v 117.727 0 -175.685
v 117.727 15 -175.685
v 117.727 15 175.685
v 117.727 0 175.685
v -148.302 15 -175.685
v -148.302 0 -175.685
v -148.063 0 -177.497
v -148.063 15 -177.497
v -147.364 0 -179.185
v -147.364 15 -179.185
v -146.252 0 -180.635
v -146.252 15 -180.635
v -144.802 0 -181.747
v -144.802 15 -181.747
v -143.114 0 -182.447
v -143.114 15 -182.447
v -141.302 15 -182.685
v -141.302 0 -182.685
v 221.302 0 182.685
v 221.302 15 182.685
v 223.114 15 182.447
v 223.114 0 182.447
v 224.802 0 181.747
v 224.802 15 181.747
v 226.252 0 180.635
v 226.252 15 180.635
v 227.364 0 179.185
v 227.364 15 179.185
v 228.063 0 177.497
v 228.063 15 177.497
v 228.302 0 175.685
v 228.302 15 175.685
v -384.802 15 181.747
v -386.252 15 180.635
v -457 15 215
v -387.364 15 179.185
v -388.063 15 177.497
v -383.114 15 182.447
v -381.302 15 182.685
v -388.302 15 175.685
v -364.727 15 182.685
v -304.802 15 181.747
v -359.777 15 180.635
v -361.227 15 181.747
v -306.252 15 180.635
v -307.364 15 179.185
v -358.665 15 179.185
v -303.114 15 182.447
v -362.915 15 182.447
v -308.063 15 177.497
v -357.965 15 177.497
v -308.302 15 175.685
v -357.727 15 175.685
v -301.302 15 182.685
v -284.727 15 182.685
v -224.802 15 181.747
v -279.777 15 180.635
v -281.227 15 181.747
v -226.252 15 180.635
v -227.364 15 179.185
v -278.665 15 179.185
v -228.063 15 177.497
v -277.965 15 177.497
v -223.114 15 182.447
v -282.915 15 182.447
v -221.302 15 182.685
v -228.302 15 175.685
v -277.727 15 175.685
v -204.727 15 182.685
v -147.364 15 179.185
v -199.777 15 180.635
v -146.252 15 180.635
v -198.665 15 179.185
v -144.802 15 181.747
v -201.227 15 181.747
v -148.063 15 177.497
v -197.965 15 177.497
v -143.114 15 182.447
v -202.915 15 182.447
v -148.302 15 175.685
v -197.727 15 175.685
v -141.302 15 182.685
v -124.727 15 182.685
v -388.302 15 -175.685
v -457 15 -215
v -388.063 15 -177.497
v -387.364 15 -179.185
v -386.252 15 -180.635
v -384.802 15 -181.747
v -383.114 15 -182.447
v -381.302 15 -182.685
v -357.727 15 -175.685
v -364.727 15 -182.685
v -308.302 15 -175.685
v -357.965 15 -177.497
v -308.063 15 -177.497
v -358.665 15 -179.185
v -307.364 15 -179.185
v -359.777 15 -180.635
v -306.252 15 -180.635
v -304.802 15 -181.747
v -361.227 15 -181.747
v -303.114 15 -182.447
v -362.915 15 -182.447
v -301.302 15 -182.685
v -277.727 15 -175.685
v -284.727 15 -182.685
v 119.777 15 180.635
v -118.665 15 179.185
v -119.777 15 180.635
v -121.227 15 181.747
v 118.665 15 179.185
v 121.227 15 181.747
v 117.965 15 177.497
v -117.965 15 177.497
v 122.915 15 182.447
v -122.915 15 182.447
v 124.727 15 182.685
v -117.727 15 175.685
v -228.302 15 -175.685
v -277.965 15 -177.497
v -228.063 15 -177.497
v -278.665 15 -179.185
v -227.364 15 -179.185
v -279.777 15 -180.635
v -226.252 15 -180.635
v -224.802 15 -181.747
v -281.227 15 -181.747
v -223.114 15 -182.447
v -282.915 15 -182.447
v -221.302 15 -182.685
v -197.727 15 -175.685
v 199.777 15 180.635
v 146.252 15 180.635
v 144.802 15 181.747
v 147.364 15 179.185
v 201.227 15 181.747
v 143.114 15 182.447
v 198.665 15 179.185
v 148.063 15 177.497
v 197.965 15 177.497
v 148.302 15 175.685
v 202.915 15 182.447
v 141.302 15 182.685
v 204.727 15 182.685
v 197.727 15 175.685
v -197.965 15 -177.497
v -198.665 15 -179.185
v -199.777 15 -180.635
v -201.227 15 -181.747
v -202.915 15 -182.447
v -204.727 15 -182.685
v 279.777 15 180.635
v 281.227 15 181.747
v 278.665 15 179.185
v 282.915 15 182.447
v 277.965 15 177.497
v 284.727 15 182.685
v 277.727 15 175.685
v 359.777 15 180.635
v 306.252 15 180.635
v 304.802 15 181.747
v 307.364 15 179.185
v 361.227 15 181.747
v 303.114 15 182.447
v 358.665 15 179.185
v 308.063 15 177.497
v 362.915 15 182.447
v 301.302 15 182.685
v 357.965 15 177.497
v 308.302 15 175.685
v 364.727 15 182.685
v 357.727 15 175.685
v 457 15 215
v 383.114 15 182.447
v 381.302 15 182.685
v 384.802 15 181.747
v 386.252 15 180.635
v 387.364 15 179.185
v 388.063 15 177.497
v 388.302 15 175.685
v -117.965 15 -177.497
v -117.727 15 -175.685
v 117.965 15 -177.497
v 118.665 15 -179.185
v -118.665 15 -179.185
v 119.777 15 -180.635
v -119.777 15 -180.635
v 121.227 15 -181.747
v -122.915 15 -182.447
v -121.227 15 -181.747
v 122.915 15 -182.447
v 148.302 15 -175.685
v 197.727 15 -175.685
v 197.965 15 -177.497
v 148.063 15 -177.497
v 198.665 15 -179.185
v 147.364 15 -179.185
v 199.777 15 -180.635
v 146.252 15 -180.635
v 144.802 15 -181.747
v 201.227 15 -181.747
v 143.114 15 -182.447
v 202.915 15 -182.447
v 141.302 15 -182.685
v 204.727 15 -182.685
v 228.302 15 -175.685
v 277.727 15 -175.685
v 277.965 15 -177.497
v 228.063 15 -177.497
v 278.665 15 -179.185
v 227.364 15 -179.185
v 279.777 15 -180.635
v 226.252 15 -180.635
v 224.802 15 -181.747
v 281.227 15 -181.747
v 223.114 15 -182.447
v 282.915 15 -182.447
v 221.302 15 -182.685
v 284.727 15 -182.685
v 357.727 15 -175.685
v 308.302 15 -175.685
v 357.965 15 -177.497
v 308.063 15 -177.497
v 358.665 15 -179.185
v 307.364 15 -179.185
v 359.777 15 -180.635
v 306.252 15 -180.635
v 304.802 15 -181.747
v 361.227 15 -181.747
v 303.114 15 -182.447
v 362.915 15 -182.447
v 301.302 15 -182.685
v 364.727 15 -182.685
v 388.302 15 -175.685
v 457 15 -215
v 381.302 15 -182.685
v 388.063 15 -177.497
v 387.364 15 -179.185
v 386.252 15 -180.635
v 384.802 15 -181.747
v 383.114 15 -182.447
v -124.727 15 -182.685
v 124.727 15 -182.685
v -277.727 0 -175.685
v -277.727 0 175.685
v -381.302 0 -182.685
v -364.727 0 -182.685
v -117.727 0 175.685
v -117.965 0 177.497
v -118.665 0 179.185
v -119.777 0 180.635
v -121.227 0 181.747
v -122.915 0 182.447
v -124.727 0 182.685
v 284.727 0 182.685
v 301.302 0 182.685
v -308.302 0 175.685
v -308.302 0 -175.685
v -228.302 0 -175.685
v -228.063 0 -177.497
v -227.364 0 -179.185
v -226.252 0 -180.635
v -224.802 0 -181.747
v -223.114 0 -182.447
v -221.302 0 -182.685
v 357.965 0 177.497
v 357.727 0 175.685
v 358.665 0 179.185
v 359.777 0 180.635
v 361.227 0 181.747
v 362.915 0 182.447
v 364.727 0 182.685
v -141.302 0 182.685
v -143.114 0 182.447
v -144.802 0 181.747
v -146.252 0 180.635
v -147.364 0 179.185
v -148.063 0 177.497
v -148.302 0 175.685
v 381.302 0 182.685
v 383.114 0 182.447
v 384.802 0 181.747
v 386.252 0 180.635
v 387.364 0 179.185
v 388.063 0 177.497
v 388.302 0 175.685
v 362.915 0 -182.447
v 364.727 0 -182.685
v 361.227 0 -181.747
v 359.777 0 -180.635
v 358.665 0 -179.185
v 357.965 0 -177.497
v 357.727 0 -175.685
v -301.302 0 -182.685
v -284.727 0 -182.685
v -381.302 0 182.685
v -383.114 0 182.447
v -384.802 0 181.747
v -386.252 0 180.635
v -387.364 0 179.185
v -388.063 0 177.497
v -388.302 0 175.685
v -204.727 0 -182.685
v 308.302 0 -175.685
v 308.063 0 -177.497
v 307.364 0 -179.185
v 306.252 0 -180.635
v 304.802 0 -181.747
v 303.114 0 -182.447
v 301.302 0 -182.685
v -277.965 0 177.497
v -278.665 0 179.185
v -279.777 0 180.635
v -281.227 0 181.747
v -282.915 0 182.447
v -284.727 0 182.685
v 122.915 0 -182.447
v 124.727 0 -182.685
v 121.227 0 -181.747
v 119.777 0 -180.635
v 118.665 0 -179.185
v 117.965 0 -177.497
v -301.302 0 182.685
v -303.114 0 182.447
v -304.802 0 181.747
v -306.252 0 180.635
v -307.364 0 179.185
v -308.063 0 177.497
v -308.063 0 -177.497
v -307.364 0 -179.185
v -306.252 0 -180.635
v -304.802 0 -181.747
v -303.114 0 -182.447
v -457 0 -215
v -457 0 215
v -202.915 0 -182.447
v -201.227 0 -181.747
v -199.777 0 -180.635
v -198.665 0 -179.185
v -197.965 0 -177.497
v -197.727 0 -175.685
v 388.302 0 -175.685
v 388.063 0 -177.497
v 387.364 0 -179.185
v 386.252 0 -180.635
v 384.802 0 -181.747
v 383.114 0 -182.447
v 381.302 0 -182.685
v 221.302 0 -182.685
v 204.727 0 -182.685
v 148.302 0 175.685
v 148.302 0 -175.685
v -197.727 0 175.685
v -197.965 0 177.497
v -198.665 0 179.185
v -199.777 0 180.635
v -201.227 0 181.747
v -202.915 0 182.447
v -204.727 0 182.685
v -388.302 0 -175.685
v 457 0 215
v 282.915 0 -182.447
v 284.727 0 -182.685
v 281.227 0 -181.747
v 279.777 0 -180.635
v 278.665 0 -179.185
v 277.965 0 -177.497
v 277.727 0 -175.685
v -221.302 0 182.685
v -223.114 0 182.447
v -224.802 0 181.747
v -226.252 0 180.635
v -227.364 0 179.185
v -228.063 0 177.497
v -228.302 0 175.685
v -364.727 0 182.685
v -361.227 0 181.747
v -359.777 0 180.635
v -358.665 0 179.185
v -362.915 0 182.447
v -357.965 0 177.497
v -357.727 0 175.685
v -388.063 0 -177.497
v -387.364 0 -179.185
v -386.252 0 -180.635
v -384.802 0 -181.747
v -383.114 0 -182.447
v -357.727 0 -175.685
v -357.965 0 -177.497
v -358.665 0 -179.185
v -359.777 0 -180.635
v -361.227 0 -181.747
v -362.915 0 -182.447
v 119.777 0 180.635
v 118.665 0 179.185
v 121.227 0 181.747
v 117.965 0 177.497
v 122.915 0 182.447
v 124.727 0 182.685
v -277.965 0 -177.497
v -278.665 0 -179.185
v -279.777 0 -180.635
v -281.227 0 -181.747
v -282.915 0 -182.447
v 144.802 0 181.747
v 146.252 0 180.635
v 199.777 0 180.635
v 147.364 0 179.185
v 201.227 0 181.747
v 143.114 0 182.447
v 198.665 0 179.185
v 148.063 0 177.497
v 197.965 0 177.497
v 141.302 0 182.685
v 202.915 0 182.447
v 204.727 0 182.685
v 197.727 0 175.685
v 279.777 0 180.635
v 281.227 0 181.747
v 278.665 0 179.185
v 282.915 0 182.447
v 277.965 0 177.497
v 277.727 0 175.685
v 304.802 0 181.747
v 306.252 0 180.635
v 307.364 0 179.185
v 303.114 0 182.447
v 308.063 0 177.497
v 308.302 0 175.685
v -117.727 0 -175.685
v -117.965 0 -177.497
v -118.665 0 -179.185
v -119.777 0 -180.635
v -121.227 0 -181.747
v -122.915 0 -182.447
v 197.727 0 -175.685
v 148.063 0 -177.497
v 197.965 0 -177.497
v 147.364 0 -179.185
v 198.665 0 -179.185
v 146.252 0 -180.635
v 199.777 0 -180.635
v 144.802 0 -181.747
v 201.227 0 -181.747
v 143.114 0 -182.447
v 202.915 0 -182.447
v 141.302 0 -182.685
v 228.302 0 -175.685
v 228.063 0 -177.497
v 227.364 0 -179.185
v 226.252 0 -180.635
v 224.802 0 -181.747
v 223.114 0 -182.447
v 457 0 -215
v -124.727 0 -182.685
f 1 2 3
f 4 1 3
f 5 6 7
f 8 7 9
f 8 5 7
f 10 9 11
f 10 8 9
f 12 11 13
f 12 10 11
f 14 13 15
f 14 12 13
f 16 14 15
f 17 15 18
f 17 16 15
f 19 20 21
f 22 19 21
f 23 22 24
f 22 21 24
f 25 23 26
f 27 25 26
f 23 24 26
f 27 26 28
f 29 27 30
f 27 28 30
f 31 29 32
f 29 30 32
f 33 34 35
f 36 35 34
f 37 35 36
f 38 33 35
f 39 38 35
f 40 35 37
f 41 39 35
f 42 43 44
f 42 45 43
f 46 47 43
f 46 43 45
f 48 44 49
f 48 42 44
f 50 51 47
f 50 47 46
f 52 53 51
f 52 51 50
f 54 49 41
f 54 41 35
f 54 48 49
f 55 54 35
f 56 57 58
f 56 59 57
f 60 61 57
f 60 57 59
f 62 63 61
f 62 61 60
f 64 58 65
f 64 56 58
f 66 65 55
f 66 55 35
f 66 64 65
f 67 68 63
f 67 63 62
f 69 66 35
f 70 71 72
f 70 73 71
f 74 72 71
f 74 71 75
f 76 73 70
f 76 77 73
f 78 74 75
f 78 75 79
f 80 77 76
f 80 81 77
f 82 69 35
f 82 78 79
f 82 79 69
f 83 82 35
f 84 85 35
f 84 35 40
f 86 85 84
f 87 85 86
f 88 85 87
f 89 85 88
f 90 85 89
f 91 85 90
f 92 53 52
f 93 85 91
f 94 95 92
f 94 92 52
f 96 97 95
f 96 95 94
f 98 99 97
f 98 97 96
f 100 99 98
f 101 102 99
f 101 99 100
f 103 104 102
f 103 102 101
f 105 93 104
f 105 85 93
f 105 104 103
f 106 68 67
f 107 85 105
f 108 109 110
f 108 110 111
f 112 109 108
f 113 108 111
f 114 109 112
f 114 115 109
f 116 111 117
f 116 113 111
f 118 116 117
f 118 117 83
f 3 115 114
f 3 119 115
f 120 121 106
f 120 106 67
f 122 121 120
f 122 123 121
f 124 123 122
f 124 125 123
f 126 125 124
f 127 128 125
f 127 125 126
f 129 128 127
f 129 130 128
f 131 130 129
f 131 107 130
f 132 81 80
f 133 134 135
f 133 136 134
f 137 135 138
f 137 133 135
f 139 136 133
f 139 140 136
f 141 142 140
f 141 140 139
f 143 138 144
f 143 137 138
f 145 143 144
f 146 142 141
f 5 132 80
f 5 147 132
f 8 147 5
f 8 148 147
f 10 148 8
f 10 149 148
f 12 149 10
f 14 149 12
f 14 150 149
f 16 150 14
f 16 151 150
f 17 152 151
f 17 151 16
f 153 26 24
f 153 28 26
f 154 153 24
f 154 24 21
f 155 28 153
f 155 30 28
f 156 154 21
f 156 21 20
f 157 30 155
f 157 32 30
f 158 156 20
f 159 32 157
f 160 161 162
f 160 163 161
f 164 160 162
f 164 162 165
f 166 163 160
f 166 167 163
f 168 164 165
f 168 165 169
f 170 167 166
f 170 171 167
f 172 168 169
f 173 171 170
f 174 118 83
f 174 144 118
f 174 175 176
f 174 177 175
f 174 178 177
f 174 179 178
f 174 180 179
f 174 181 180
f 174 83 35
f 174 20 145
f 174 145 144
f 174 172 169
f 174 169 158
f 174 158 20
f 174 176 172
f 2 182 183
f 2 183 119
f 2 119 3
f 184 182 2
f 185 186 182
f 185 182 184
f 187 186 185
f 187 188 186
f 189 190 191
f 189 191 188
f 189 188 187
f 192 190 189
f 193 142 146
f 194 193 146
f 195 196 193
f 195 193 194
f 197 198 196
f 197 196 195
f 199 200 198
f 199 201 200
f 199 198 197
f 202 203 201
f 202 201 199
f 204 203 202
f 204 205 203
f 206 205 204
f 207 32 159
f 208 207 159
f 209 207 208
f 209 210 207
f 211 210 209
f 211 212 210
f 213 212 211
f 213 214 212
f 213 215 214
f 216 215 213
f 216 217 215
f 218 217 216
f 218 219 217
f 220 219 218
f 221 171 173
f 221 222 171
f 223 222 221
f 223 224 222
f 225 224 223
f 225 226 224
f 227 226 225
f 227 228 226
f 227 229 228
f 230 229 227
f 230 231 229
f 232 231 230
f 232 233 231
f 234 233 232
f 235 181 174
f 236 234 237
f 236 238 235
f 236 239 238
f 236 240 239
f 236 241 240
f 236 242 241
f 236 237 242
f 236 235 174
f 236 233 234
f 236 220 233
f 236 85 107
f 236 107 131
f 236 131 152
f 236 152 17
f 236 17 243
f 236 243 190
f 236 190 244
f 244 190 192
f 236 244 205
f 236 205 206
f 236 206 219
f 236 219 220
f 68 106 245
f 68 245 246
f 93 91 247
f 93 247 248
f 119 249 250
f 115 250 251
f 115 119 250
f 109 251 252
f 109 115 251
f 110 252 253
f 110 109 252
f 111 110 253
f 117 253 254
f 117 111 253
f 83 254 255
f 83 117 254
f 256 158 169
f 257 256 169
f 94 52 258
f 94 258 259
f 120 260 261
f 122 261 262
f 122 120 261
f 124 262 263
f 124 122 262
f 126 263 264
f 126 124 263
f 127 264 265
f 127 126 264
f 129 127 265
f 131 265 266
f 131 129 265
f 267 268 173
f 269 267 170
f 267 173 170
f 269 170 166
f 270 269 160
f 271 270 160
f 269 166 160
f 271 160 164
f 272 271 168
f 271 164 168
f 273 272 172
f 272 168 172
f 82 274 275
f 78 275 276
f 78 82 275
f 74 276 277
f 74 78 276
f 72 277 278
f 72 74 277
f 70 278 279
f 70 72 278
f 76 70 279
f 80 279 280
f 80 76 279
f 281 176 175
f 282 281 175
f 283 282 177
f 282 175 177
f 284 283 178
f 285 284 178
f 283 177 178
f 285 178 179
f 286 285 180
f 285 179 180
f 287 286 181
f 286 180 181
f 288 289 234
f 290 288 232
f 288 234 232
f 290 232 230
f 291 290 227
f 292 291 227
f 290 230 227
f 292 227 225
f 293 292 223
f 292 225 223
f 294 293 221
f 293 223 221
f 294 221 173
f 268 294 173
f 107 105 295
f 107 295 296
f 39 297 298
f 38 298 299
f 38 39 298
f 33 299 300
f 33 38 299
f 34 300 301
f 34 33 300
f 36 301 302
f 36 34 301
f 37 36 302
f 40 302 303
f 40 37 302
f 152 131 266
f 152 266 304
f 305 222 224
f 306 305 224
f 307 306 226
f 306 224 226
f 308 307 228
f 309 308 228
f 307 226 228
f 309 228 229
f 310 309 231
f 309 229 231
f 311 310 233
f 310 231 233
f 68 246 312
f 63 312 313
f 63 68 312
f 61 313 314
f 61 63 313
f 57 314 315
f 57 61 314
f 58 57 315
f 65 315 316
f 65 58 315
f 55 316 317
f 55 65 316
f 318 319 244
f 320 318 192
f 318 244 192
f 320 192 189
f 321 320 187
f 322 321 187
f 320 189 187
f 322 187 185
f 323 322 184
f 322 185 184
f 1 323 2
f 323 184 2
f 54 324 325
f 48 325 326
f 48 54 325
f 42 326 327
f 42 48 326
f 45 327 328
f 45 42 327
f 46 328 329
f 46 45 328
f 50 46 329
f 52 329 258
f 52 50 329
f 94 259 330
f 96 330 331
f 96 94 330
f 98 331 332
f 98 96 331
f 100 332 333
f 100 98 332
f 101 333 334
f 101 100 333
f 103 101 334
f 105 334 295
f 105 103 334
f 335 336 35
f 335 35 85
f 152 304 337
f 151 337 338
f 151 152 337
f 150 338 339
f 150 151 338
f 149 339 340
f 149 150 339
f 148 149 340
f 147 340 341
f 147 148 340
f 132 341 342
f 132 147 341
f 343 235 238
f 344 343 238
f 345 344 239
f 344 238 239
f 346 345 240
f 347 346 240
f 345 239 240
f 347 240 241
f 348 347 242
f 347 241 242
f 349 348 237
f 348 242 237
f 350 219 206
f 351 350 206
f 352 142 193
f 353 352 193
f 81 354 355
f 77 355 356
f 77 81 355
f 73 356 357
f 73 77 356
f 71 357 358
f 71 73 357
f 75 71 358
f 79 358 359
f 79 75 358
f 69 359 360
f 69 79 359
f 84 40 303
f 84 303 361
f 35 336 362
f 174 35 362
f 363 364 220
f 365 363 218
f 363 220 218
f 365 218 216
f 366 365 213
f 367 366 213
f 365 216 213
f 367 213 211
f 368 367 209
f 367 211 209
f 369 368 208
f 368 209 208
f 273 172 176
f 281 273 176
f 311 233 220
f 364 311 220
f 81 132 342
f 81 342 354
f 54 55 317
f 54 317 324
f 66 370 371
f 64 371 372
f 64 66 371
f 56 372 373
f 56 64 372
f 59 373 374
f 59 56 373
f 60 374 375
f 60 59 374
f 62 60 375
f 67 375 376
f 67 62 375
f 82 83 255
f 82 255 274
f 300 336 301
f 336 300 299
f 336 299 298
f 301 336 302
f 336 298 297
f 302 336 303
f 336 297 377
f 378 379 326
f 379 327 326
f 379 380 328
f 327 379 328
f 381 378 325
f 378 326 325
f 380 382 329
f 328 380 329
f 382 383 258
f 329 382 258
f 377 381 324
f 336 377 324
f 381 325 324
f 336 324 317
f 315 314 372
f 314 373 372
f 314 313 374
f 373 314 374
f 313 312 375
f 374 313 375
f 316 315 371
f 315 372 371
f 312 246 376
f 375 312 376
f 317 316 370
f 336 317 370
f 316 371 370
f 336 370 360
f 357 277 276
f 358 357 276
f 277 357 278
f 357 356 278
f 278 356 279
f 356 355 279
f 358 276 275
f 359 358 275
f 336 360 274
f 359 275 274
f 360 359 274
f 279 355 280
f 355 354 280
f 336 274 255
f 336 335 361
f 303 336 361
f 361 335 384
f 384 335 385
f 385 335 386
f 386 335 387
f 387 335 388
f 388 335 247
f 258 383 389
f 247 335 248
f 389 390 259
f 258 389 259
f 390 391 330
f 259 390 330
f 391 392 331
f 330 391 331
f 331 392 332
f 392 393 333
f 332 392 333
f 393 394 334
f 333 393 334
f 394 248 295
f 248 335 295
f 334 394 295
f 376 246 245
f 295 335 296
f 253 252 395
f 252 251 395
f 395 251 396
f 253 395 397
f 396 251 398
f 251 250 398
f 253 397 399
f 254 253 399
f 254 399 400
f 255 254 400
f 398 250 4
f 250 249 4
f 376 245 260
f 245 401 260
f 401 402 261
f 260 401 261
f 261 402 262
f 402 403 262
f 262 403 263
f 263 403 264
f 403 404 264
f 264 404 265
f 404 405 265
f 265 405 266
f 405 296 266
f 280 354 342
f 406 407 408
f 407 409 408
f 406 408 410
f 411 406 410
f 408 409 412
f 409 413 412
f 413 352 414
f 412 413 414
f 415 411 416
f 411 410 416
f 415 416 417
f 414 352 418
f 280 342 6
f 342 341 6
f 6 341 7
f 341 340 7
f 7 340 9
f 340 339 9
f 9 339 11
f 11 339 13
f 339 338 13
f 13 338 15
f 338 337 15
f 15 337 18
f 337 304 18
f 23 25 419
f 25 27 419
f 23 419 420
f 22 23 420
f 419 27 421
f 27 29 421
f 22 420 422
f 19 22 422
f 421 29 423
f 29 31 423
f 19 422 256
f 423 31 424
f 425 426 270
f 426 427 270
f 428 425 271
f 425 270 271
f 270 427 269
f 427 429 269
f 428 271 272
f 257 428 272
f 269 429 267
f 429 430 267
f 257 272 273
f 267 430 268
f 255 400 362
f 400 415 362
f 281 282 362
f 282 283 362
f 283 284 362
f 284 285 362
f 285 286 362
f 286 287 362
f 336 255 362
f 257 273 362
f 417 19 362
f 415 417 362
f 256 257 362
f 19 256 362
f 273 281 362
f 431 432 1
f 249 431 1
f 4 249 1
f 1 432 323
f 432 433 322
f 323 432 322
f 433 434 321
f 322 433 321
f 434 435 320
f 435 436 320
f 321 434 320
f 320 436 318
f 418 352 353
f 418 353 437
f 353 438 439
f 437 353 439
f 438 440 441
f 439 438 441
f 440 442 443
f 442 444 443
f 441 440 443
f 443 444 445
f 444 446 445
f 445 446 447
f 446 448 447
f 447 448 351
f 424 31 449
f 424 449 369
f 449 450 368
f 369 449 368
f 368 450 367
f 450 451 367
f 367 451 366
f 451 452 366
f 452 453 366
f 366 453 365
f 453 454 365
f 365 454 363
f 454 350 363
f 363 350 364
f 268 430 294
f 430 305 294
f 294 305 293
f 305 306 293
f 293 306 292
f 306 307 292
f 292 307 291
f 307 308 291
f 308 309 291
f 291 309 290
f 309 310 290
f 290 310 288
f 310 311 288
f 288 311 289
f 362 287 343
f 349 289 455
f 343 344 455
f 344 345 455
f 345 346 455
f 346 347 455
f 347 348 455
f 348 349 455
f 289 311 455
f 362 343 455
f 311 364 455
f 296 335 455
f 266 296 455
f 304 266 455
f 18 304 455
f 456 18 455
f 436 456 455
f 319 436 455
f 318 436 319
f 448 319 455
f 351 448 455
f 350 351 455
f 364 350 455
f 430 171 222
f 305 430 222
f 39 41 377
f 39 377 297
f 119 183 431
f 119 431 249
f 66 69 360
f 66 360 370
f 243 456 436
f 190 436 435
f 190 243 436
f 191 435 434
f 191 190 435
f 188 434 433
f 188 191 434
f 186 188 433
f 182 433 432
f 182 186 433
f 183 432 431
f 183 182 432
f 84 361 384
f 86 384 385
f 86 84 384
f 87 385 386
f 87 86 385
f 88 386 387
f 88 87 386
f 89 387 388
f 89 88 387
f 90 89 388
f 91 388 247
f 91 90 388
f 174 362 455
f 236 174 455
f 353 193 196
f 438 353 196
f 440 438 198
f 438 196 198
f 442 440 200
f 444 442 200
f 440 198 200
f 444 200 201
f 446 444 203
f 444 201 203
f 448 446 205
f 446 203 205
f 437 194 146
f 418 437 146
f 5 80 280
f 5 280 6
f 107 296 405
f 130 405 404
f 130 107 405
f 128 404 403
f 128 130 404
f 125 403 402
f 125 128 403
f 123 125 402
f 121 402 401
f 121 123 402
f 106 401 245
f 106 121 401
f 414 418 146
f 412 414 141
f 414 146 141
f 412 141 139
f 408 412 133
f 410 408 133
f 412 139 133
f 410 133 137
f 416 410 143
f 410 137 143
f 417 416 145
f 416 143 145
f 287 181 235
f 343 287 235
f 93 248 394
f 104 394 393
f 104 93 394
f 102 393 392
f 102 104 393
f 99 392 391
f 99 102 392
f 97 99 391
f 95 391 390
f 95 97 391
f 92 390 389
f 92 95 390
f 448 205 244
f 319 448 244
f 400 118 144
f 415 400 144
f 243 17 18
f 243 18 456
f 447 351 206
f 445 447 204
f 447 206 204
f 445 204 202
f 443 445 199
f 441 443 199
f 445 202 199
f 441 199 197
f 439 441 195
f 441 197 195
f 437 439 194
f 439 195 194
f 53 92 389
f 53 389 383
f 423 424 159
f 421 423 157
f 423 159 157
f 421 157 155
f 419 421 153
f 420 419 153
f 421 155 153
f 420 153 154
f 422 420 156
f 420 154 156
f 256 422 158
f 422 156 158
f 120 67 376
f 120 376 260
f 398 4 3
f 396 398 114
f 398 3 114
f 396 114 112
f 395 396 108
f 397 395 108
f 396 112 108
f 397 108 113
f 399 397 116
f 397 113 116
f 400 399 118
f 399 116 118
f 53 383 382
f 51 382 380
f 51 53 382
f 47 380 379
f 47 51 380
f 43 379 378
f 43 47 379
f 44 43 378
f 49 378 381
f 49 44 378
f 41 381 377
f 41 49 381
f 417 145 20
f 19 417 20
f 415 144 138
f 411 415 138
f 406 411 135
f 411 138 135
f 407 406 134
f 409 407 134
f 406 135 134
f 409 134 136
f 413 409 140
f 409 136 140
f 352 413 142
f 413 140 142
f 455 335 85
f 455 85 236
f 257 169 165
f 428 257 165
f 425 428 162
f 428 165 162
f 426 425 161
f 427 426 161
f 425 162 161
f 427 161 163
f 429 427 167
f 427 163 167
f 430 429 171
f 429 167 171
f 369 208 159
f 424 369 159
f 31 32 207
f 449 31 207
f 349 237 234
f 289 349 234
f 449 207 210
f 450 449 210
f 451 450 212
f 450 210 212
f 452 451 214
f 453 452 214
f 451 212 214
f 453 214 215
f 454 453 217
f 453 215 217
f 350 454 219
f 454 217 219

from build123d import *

# Parameters (mm, degrees)
SKETCH1_W            = 914
SKETCH1_H            = 430
BOSS_EXTRUDE1_DEPTH  = 15
CUT_EXTRUDE2_DEPTH   = 16
LPATTERN1_COUNT      = 4
LPATTERN1_PITCH      = 80
MIRROR1_COPY_1_DEPTH = 16
MIRROR1_COPY_2_DEPTH = 16
MIRROR1_COPY_3_DEPTH = 16


with BuildPart() as part:
    # Sketch1 → Boss-Extrude1 (new body)
    with BuildSketch(Plane(origin=(0, 0, 0), x_dir=(1, 0, 0), z_dir=(0, 1, 0))):
        Rectangle(SKETCH1_W, SKETCH1_H)
    extrude(amount=BOSS_EXTRUDE1_DEPTH)

    # Sketch2 → Cut-Extrude2 (cut, through all)
    with BuildSketch(Plane(origin=(0, 15, 0), x_dir=(1, 0, 0), z_dir=(0, 1, 0))):
        with BuildLine():
            Line((364.726860249, -182.685298289), (381.301805569, -182.685298289))
            ThreePointArc((381.301805569, -182.685298289), (386.251553037, -180.635045758), (388.301805569, -175.685298289))
            Line((388.301805569, -175.685298289), (388.301805569, 175.685298289))
            ThreePointArc((388.301805569, 175.685298289), (386.251553037, 180.635045758), (381.301805569, 182.685298289))
            Line((381.301805569, 182.685298289), (364.726860249, 182.685298289))
            ThreePointArc((364.726860249, 182.685298289), (359.77711278, 180.635045758), (357.726860249, 175.685298289))
            Line((357.726860249, 175.685298289), (357.726860249, -175.685298289))
            ThreePointArc((357.726860249, -175.685298289), (359.77711278, -180.635045758), (364.726860249, -182.685298289))
        make_face()
    cut_extrude2 = extrude(amount=-CUT_EXTRUDE2_DEPTH, mode=Mode.SUBTRACT)

    # LPattern1: Cut-Extrude2 ×4
    with Locations(*[(-i * LPATTERN1_PITCH, 0, 0) for i in range(1, LPATTERN1_COUNT)]):
        add(cut_extrude2, mode=Mode.SUBTRACT)

    # Mirror1: Cut-Extrude2 across plane
    add(cut_extrude2.mirror(Plane(origin=(0, 0, 0), x_dir=(0, 0, 1), z_dir=(1, 0, 0))), mode=Mode.SUBTRACT)

    # Mirror1 copy 1 sketch → Mirror1 copy 1 (cut, through all)
    with BuildSketch(Plane(origin=(80, 15, 0), x_dir=(-1, 0, 0), z_dir=(0, 1, 0))):
        with BuildLine():
            Line((364.726860249, 182.685298289), (381.301805569, 182.685298289))
            ThreePointArc((381.301805569, 182.685298289), (386.251553037, 180.635045758), (388.301805569, 175.685298289))
            Line((388.301805569, 175.685298289), (388.301805569, -175.685298289))
            ThreePointArc((388.301805569, -175.685298289), (386.251553037, -180.635045758), (381.301805569, -182.685298289))
            Line((381.301805569, -182.685298289), (364.726860249, -182.685298289))
            ThreePointArc((364.726860249, -182.685298289), (359.77711278, -180.635045758), (357.726860249, -175.685298289))
            Line((357.726860249, -175.685298289), (357.726860249, 175.685298289))
            ThreePointArc((357.726860249, 175.685298289), (359.77711278, 180.635045758), (364.726860249, 182.685298289))
        make_face()
    extrude(amount=-MIRROR1_COPY_1_DEPTH, mode=Mode.SUBTRACT)

    # Mirror1 copy 2 sketch → Mirror1 copy 2 (cut, through all)
    with BuildSketch(Plane(origin=(160, 15, 0), x_dir=(-1, 0, 0), z_dir=(0, 1, 0))):
        with BuildLine():
            Line((364.726860249, 182.685298289), (381.301805569, 182.685298289))
            ThreePointArc((381.301805569, 182.685298289), (386.251553037, 180.635045758), (388.301805569, 175.685298289))
            Line((388.301805569, 175.685298289), (388.301805569, -175.685298289))
            ThreePointArc((388.301805569, -175.685298289), (386.251553037, -180.635045758), (381.301805569, -182.685298289))
            Line((381.301805569, -182.685298289), (364.726860249, -182.685298289))
            ThreePointArc((364.726860249, -182.685298289), (359.77711278, -180.635045758), (357.726860249, -175.685298289))
            Line((357.726860249, -175.685298289), (357.726860249, 175.685298289))
            ThreePointArc((357.726860249, 175.685298289), (359.77711278, 180.635045758), (364.726860249, 182.685298289))
        make_face()
    extrude(amount=-MIRROR1_COPY_2_DEPTH, mode=Mode.SUBTRACT)

    # Mirror1 copy 3 sketch → Mirror1 copy 3 (cut, through all)
    with BuildSketch(Plane(origin=(240, 15, 0), x_dir=(-1, 0, 0), z_dir=(0, 1, 0))):
        with BuildLine():
            Line((364.726860249, 182.685298289), (381.301805569, 182.685298289))
            ThreePointArc((381.301805569, 182.685298289), (386.251553037, 180.635045758), (388.301805569, 175.685298289))
            Line((388.301805569, 175.685298289), (388.301805569, -175.685298289))
            ThreePointArc((388.301805569, -175.685298289), (386.251553037, -180.635045758), (381.301805569, -182.685298289))
            Line((381.301805569, -182.685298289), (364.726860249, -182.685298289))
            ThreePointArc((364.726860249, -182.685298289), (359.77711278, -180.635045758), (357.726860249, -175.685298289))
            Line((357.726860249, -175.685298289), (357.726860249, 175.685298289))
            ThreePointArc((357.726860249, 175.685298289), (359.77711278, 180.635045758), (364.726860249, 182.685298289))
        make_face()
    extrude(amount=-MIRROR1_COPY_3_DEPTH, mode=Mode.SUBTRACT)


solid = part.part
